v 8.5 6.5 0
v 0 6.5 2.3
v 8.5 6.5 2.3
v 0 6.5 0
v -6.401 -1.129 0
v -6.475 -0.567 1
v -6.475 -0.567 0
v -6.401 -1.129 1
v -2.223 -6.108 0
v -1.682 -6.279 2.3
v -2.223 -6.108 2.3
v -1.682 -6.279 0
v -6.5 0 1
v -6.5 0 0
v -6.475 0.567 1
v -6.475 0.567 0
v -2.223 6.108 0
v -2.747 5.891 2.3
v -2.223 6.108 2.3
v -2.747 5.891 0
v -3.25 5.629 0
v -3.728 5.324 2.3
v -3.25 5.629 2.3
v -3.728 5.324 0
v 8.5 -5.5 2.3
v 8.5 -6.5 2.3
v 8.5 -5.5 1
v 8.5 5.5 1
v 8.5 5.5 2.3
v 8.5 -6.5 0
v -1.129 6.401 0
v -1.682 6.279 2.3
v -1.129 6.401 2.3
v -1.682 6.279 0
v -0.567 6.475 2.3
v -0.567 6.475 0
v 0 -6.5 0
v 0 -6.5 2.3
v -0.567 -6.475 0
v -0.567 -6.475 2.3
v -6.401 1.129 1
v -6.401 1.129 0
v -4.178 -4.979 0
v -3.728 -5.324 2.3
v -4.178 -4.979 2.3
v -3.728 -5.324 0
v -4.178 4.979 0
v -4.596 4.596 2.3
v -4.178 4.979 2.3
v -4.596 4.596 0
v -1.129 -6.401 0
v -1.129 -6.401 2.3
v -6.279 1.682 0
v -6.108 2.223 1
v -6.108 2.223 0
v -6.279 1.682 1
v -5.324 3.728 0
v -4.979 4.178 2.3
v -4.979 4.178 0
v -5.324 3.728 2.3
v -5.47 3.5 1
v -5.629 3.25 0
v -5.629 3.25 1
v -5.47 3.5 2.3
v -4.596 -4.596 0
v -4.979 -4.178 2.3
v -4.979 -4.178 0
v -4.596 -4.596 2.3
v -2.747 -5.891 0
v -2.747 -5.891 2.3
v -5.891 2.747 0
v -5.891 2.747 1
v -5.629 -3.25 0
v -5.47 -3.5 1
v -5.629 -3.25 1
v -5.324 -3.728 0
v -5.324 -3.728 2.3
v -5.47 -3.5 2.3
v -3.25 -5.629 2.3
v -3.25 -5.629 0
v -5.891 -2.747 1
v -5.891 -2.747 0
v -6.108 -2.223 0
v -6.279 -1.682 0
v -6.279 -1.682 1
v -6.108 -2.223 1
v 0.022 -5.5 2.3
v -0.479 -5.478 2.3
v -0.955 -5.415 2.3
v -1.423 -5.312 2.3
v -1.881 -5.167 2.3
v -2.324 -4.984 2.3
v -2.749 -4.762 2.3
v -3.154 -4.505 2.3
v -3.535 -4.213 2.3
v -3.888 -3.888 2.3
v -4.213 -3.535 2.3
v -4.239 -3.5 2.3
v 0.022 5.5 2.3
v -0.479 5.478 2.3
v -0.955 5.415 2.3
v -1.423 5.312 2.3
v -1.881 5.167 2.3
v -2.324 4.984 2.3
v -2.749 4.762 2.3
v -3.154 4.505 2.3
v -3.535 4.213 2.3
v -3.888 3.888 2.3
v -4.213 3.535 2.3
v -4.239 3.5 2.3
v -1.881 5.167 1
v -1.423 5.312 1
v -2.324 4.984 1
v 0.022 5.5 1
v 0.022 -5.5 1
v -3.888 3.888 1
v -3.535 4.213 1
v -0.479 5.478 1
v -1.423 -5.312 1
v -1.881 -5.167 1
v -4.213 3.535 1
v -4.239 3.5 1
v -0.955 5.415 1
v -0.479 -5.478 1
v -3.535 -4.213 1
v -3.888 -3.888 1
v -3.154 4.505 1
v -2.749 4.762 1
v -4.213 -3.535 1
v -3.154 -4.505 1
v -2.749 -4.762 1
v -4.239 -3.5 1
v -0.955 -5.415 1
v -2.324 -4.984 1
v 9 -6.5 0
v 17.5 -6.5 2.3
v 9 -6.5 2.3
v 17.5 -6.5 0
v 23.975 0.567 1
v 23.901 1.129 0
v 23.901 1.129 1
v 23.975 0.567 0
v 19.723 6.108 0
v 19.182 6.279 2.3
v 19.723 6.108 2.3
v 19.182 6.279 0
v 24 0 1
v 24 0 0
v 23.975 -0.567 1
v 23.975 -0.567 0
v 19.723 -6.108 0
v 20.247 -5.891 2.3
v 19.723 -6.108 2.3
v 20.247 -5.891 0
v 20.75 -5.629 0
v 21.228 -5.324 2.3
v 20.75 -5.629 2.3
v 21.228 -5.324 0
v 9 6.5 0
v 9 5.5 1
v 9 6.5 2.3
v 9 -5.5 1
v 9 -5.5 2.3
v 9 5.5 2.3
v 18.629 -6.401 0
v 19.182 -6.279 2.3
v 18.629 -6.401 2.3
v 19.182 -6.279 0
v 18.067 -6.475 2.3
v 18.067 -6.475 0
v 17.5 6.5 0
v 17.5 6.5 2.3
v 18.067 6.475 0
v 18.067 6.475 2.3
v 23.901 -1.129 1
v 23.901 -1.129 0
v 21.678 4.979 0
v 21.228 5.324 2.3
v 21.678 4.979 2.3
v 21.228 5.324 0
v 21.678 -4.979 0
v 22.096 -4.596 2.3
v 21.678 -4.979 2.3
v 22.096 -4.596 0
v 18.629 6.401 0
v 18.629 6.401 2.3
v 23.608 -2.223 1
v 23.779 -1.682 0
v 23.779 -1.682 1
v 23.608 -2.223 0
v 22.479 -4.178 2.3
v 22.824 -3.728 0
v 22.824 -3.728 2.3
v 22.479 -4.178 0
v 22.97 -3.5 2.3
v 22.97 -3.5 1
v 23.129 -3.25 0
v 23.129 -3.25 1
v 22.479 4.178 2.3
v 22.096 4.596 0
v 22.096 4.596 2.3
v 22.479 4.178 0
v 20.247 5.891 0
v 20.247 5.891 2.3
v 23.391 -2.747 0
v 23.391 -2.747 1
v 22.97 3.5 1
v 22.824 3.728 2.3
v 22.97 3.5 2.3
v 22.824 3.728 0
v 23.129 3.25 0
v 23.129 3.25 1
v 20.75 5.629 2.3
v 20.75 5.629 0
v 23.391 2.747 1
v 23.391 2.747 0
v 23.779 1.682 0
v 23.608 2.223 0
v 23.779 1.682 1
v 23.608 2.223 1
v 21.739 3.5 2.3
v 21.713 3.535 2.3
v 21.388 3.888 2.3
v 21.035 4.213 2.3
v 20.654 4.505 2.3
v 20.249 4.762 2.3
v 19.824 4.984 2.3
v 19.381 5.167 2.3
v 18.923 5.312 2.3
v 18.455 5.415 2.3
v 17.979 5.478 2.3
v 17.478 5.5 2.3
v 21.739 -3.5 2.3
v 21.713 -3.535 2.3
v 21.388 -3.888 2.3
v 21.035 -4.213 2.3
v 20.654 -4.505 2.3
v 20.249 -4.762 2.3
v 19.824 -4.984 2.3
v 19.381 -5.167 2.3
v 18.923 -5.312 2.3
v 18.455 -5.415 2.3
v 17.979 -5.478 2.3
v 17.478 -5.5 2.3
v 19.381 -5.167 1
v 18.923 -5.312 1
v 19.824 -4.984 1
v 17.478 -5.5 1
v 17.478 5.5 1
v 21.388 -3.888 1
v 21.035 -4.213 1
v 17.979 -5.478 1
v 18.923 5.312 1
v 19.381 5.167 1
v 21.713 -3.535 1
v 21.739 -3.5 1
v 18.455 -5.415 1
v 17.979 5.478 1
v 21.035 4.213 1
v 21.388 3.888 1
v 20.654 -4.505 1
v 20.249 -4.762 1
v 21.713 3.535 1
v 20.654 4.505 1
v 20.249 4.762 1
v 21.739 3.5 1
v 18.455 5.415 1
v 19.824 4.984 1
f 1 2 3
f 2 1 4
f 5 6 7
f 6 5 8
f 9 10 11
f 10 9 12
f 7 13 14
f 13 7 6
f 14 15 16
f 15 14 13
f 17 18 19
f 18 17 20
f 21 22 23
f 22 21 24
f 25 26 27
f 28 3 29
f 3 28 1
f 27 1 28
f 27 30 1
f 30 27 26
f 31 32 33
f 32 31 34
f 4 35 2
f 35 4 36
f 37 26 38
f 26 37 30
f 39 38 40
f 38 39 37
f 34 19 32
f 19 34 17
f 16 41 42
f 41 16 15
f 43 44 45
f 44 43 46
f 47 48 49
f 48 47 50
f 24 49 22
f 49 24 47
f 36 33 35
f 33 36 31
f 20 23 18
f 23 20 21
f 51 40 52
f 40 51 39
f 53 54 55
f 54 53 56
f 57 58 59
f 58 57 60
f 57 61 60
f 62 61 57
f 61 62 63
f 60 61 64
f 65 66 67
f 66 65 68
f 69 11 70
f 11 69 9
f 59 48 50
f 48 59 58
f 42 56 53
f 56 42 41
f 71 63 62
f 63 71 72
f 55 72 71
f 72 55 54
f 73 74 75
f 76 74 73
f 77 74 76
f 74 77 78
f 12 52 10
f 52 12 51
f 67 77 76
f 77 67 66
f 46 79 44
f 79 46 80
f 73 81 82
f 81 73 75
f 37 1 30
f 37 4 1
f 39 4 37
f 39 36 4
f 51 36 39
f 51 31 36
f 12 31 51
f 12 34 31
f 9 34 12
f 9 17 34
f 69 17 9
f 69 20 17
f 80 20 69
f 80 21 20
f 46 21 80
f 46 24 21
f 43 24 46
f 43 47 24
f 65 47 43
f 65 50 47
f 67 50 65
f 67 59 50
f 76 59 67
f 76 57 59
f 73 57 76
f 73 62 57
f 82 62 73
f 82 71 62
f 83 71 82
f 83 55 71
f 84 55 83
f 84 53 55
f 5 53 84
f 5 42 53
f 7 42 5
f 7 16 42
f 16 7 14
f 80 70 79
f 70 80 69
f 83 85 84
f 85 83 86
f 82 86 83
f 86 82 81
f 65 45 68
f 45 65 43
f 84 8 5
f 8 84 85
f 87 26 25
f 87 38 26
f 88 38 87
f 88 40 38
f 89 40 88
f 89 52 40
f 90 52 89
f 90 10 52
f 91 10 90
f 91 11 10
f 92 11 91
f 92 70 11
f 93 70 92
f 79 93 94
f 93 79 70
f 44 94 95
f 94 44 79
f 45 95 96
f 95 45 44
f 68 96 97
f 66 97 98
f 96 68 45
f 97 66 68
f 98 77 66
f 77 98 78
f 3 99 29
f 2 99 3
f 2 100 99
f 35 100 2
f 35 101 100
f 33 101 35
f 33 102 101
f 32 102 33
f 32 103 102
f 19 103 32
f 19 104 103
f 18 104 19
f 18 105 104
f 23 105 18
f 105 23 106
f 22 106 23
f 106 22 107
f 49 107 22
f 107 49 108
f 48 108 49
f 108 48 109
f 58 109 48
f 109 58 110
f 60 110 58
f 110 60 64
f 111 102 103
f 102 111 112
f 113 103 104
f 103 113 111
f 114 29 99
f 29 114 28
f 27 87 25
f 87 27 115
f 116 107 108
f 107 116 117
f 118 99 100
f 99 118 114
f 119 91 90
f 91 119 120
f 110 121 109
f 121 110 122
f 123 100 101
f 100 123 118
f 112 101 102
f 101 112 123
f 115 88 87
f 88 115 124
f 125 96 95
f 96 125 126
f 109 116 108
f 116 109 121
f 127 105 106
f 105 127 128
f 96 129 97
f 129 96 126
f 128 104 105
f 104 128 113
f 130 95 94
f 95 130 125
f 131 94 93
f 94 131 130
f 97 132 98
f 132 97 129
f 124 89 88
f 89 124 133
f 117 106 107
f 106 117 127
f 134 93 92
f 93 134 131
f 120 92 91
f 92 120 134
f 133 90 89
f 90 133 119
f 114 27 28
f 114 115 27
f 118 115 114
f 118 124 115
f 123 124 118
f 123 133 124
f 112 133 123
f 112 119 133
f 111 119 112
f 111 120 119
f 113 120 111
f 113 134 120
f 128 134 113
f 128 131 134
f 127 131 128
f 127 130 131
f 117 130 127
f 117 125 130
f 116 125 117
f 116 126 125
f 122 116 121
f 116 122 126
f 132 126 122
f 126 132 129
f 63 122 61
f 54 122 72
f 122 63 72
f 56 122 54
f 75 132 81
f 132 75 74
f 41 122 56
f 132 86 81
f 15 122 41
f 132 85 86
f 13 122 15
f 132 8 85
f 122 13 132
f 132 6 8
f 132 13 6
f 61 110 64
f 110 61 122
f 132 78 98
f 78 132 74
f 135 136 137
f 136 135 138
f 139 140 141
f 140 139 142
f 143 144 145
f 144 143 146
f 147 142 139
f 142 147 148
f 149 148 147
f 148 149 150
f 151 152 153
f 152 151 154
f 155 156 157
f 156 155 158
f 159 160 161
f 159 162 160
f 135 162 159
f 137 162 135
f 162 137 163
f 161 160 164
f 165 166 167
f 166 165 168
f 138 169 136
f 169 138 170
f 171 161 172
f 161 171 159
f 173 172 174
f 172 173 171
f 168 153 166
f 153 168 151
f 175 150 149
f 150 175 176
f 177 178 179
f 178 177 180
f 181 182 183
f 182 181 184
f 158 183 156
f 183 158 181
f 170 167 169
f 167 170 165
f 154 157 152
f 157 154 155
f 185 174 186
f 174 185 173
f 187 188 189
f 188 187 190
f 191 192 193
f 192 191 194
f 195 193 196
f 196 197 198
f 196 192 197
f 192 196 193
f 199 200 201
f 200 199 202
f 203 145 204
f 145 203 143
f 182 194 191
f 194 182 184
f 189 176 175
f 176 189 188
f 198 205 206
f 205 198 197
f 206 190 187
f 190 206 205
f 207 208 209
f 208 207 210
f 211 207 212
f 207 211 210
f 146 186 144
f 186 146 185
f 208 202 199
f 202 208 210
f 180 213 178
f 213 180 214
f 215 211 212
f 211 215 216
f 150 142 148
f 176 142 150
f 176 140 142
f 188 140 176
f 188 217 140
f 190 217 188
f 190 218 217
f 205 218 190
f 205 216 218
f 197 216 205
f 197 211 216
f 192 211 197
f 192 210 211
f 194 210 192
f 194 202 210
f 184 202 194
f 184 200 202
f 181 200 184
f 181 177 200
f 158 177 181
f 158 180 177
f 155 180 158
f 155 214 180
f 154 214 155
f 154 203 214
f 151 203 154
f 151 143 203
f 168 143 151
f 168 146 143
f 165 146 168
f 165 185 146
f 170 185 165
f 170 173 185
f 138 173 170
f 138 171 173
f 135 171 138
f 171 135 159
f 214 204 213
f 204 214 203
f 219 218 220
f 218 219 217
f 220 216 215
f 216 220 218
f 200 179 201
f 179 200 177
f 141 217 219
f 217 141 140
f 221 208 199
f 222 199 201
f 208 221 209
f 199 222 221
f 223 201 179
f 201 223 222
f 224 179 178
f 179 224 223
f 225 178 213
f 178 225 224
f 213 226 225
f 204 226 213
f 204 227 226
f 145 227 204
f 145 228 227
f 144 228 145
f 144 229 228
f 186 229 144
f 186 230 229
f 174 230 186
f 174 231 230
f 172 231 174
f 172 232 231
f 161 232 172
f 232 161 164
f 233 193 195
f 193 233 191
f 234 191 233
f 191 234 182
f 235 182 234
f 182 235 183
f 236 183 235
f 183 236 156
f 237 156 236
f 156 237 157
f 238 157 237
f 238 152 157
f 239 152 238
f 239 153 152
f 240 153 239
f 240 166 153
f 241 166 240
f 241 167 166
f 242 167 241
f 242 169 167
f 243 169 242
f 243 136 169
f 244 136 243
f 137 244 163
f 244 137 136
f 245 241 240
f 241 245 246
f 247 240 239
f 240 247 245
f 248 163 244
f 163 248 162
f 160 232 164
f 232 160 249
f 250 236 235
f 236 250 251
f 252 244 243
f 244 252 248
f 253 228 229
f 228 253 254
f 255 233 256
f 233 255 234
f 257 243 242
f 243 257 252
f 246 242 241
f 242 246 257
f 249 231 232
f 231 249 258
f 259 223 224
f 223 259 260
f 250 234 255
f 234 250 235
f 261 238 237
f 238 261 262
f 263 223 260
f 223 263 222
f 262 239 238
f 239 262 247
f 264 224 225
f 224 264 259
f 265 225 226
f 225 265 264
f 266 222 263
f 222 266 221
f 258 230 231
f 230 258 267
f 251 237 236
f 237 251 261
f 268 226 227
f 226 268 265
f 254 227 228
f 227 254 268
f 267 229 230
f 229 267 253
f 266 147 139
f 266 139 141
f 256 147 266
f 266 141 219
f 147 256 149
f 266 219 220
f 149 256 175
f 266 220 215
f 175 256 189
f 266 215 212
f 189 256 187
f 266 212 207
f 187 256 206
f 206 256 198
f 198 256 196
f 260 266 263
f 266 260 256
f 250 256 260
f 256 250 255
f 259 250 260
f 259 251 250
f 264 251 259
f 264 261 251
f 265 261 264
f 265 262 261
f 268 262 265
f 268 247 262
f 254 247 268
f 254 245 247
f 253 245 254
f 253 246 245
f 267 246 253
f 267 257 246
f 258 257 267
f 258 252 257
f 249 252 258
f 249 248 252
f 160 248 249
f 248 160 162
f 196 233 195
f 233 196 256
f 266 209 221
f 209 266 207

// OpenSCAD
//$fn=60;
$fa=5;
$fs=.4;

main();
translate([17.5/*0*/,0,0/*4.7*/]) rotate([/*18*/0,0,180/*0*/]) main();

module main() {
    difference(){
        linear_extrude(height=2.3) base_shape();
        translate([0,0,1]) linear_extrude(height=2) inner_shape();
        translate([0,0,2]) cube([20,7,2],center=true);
    }
}

module inner_shape(){
    offset(r=-1) base_shape();
    translate([6,0,0]) square([6,11],center=true);
}

module base_shape(){
    hull(){
        circle(d=13);
        translate([6.5,0,0]) square([4,13],center=true);
    }
}
